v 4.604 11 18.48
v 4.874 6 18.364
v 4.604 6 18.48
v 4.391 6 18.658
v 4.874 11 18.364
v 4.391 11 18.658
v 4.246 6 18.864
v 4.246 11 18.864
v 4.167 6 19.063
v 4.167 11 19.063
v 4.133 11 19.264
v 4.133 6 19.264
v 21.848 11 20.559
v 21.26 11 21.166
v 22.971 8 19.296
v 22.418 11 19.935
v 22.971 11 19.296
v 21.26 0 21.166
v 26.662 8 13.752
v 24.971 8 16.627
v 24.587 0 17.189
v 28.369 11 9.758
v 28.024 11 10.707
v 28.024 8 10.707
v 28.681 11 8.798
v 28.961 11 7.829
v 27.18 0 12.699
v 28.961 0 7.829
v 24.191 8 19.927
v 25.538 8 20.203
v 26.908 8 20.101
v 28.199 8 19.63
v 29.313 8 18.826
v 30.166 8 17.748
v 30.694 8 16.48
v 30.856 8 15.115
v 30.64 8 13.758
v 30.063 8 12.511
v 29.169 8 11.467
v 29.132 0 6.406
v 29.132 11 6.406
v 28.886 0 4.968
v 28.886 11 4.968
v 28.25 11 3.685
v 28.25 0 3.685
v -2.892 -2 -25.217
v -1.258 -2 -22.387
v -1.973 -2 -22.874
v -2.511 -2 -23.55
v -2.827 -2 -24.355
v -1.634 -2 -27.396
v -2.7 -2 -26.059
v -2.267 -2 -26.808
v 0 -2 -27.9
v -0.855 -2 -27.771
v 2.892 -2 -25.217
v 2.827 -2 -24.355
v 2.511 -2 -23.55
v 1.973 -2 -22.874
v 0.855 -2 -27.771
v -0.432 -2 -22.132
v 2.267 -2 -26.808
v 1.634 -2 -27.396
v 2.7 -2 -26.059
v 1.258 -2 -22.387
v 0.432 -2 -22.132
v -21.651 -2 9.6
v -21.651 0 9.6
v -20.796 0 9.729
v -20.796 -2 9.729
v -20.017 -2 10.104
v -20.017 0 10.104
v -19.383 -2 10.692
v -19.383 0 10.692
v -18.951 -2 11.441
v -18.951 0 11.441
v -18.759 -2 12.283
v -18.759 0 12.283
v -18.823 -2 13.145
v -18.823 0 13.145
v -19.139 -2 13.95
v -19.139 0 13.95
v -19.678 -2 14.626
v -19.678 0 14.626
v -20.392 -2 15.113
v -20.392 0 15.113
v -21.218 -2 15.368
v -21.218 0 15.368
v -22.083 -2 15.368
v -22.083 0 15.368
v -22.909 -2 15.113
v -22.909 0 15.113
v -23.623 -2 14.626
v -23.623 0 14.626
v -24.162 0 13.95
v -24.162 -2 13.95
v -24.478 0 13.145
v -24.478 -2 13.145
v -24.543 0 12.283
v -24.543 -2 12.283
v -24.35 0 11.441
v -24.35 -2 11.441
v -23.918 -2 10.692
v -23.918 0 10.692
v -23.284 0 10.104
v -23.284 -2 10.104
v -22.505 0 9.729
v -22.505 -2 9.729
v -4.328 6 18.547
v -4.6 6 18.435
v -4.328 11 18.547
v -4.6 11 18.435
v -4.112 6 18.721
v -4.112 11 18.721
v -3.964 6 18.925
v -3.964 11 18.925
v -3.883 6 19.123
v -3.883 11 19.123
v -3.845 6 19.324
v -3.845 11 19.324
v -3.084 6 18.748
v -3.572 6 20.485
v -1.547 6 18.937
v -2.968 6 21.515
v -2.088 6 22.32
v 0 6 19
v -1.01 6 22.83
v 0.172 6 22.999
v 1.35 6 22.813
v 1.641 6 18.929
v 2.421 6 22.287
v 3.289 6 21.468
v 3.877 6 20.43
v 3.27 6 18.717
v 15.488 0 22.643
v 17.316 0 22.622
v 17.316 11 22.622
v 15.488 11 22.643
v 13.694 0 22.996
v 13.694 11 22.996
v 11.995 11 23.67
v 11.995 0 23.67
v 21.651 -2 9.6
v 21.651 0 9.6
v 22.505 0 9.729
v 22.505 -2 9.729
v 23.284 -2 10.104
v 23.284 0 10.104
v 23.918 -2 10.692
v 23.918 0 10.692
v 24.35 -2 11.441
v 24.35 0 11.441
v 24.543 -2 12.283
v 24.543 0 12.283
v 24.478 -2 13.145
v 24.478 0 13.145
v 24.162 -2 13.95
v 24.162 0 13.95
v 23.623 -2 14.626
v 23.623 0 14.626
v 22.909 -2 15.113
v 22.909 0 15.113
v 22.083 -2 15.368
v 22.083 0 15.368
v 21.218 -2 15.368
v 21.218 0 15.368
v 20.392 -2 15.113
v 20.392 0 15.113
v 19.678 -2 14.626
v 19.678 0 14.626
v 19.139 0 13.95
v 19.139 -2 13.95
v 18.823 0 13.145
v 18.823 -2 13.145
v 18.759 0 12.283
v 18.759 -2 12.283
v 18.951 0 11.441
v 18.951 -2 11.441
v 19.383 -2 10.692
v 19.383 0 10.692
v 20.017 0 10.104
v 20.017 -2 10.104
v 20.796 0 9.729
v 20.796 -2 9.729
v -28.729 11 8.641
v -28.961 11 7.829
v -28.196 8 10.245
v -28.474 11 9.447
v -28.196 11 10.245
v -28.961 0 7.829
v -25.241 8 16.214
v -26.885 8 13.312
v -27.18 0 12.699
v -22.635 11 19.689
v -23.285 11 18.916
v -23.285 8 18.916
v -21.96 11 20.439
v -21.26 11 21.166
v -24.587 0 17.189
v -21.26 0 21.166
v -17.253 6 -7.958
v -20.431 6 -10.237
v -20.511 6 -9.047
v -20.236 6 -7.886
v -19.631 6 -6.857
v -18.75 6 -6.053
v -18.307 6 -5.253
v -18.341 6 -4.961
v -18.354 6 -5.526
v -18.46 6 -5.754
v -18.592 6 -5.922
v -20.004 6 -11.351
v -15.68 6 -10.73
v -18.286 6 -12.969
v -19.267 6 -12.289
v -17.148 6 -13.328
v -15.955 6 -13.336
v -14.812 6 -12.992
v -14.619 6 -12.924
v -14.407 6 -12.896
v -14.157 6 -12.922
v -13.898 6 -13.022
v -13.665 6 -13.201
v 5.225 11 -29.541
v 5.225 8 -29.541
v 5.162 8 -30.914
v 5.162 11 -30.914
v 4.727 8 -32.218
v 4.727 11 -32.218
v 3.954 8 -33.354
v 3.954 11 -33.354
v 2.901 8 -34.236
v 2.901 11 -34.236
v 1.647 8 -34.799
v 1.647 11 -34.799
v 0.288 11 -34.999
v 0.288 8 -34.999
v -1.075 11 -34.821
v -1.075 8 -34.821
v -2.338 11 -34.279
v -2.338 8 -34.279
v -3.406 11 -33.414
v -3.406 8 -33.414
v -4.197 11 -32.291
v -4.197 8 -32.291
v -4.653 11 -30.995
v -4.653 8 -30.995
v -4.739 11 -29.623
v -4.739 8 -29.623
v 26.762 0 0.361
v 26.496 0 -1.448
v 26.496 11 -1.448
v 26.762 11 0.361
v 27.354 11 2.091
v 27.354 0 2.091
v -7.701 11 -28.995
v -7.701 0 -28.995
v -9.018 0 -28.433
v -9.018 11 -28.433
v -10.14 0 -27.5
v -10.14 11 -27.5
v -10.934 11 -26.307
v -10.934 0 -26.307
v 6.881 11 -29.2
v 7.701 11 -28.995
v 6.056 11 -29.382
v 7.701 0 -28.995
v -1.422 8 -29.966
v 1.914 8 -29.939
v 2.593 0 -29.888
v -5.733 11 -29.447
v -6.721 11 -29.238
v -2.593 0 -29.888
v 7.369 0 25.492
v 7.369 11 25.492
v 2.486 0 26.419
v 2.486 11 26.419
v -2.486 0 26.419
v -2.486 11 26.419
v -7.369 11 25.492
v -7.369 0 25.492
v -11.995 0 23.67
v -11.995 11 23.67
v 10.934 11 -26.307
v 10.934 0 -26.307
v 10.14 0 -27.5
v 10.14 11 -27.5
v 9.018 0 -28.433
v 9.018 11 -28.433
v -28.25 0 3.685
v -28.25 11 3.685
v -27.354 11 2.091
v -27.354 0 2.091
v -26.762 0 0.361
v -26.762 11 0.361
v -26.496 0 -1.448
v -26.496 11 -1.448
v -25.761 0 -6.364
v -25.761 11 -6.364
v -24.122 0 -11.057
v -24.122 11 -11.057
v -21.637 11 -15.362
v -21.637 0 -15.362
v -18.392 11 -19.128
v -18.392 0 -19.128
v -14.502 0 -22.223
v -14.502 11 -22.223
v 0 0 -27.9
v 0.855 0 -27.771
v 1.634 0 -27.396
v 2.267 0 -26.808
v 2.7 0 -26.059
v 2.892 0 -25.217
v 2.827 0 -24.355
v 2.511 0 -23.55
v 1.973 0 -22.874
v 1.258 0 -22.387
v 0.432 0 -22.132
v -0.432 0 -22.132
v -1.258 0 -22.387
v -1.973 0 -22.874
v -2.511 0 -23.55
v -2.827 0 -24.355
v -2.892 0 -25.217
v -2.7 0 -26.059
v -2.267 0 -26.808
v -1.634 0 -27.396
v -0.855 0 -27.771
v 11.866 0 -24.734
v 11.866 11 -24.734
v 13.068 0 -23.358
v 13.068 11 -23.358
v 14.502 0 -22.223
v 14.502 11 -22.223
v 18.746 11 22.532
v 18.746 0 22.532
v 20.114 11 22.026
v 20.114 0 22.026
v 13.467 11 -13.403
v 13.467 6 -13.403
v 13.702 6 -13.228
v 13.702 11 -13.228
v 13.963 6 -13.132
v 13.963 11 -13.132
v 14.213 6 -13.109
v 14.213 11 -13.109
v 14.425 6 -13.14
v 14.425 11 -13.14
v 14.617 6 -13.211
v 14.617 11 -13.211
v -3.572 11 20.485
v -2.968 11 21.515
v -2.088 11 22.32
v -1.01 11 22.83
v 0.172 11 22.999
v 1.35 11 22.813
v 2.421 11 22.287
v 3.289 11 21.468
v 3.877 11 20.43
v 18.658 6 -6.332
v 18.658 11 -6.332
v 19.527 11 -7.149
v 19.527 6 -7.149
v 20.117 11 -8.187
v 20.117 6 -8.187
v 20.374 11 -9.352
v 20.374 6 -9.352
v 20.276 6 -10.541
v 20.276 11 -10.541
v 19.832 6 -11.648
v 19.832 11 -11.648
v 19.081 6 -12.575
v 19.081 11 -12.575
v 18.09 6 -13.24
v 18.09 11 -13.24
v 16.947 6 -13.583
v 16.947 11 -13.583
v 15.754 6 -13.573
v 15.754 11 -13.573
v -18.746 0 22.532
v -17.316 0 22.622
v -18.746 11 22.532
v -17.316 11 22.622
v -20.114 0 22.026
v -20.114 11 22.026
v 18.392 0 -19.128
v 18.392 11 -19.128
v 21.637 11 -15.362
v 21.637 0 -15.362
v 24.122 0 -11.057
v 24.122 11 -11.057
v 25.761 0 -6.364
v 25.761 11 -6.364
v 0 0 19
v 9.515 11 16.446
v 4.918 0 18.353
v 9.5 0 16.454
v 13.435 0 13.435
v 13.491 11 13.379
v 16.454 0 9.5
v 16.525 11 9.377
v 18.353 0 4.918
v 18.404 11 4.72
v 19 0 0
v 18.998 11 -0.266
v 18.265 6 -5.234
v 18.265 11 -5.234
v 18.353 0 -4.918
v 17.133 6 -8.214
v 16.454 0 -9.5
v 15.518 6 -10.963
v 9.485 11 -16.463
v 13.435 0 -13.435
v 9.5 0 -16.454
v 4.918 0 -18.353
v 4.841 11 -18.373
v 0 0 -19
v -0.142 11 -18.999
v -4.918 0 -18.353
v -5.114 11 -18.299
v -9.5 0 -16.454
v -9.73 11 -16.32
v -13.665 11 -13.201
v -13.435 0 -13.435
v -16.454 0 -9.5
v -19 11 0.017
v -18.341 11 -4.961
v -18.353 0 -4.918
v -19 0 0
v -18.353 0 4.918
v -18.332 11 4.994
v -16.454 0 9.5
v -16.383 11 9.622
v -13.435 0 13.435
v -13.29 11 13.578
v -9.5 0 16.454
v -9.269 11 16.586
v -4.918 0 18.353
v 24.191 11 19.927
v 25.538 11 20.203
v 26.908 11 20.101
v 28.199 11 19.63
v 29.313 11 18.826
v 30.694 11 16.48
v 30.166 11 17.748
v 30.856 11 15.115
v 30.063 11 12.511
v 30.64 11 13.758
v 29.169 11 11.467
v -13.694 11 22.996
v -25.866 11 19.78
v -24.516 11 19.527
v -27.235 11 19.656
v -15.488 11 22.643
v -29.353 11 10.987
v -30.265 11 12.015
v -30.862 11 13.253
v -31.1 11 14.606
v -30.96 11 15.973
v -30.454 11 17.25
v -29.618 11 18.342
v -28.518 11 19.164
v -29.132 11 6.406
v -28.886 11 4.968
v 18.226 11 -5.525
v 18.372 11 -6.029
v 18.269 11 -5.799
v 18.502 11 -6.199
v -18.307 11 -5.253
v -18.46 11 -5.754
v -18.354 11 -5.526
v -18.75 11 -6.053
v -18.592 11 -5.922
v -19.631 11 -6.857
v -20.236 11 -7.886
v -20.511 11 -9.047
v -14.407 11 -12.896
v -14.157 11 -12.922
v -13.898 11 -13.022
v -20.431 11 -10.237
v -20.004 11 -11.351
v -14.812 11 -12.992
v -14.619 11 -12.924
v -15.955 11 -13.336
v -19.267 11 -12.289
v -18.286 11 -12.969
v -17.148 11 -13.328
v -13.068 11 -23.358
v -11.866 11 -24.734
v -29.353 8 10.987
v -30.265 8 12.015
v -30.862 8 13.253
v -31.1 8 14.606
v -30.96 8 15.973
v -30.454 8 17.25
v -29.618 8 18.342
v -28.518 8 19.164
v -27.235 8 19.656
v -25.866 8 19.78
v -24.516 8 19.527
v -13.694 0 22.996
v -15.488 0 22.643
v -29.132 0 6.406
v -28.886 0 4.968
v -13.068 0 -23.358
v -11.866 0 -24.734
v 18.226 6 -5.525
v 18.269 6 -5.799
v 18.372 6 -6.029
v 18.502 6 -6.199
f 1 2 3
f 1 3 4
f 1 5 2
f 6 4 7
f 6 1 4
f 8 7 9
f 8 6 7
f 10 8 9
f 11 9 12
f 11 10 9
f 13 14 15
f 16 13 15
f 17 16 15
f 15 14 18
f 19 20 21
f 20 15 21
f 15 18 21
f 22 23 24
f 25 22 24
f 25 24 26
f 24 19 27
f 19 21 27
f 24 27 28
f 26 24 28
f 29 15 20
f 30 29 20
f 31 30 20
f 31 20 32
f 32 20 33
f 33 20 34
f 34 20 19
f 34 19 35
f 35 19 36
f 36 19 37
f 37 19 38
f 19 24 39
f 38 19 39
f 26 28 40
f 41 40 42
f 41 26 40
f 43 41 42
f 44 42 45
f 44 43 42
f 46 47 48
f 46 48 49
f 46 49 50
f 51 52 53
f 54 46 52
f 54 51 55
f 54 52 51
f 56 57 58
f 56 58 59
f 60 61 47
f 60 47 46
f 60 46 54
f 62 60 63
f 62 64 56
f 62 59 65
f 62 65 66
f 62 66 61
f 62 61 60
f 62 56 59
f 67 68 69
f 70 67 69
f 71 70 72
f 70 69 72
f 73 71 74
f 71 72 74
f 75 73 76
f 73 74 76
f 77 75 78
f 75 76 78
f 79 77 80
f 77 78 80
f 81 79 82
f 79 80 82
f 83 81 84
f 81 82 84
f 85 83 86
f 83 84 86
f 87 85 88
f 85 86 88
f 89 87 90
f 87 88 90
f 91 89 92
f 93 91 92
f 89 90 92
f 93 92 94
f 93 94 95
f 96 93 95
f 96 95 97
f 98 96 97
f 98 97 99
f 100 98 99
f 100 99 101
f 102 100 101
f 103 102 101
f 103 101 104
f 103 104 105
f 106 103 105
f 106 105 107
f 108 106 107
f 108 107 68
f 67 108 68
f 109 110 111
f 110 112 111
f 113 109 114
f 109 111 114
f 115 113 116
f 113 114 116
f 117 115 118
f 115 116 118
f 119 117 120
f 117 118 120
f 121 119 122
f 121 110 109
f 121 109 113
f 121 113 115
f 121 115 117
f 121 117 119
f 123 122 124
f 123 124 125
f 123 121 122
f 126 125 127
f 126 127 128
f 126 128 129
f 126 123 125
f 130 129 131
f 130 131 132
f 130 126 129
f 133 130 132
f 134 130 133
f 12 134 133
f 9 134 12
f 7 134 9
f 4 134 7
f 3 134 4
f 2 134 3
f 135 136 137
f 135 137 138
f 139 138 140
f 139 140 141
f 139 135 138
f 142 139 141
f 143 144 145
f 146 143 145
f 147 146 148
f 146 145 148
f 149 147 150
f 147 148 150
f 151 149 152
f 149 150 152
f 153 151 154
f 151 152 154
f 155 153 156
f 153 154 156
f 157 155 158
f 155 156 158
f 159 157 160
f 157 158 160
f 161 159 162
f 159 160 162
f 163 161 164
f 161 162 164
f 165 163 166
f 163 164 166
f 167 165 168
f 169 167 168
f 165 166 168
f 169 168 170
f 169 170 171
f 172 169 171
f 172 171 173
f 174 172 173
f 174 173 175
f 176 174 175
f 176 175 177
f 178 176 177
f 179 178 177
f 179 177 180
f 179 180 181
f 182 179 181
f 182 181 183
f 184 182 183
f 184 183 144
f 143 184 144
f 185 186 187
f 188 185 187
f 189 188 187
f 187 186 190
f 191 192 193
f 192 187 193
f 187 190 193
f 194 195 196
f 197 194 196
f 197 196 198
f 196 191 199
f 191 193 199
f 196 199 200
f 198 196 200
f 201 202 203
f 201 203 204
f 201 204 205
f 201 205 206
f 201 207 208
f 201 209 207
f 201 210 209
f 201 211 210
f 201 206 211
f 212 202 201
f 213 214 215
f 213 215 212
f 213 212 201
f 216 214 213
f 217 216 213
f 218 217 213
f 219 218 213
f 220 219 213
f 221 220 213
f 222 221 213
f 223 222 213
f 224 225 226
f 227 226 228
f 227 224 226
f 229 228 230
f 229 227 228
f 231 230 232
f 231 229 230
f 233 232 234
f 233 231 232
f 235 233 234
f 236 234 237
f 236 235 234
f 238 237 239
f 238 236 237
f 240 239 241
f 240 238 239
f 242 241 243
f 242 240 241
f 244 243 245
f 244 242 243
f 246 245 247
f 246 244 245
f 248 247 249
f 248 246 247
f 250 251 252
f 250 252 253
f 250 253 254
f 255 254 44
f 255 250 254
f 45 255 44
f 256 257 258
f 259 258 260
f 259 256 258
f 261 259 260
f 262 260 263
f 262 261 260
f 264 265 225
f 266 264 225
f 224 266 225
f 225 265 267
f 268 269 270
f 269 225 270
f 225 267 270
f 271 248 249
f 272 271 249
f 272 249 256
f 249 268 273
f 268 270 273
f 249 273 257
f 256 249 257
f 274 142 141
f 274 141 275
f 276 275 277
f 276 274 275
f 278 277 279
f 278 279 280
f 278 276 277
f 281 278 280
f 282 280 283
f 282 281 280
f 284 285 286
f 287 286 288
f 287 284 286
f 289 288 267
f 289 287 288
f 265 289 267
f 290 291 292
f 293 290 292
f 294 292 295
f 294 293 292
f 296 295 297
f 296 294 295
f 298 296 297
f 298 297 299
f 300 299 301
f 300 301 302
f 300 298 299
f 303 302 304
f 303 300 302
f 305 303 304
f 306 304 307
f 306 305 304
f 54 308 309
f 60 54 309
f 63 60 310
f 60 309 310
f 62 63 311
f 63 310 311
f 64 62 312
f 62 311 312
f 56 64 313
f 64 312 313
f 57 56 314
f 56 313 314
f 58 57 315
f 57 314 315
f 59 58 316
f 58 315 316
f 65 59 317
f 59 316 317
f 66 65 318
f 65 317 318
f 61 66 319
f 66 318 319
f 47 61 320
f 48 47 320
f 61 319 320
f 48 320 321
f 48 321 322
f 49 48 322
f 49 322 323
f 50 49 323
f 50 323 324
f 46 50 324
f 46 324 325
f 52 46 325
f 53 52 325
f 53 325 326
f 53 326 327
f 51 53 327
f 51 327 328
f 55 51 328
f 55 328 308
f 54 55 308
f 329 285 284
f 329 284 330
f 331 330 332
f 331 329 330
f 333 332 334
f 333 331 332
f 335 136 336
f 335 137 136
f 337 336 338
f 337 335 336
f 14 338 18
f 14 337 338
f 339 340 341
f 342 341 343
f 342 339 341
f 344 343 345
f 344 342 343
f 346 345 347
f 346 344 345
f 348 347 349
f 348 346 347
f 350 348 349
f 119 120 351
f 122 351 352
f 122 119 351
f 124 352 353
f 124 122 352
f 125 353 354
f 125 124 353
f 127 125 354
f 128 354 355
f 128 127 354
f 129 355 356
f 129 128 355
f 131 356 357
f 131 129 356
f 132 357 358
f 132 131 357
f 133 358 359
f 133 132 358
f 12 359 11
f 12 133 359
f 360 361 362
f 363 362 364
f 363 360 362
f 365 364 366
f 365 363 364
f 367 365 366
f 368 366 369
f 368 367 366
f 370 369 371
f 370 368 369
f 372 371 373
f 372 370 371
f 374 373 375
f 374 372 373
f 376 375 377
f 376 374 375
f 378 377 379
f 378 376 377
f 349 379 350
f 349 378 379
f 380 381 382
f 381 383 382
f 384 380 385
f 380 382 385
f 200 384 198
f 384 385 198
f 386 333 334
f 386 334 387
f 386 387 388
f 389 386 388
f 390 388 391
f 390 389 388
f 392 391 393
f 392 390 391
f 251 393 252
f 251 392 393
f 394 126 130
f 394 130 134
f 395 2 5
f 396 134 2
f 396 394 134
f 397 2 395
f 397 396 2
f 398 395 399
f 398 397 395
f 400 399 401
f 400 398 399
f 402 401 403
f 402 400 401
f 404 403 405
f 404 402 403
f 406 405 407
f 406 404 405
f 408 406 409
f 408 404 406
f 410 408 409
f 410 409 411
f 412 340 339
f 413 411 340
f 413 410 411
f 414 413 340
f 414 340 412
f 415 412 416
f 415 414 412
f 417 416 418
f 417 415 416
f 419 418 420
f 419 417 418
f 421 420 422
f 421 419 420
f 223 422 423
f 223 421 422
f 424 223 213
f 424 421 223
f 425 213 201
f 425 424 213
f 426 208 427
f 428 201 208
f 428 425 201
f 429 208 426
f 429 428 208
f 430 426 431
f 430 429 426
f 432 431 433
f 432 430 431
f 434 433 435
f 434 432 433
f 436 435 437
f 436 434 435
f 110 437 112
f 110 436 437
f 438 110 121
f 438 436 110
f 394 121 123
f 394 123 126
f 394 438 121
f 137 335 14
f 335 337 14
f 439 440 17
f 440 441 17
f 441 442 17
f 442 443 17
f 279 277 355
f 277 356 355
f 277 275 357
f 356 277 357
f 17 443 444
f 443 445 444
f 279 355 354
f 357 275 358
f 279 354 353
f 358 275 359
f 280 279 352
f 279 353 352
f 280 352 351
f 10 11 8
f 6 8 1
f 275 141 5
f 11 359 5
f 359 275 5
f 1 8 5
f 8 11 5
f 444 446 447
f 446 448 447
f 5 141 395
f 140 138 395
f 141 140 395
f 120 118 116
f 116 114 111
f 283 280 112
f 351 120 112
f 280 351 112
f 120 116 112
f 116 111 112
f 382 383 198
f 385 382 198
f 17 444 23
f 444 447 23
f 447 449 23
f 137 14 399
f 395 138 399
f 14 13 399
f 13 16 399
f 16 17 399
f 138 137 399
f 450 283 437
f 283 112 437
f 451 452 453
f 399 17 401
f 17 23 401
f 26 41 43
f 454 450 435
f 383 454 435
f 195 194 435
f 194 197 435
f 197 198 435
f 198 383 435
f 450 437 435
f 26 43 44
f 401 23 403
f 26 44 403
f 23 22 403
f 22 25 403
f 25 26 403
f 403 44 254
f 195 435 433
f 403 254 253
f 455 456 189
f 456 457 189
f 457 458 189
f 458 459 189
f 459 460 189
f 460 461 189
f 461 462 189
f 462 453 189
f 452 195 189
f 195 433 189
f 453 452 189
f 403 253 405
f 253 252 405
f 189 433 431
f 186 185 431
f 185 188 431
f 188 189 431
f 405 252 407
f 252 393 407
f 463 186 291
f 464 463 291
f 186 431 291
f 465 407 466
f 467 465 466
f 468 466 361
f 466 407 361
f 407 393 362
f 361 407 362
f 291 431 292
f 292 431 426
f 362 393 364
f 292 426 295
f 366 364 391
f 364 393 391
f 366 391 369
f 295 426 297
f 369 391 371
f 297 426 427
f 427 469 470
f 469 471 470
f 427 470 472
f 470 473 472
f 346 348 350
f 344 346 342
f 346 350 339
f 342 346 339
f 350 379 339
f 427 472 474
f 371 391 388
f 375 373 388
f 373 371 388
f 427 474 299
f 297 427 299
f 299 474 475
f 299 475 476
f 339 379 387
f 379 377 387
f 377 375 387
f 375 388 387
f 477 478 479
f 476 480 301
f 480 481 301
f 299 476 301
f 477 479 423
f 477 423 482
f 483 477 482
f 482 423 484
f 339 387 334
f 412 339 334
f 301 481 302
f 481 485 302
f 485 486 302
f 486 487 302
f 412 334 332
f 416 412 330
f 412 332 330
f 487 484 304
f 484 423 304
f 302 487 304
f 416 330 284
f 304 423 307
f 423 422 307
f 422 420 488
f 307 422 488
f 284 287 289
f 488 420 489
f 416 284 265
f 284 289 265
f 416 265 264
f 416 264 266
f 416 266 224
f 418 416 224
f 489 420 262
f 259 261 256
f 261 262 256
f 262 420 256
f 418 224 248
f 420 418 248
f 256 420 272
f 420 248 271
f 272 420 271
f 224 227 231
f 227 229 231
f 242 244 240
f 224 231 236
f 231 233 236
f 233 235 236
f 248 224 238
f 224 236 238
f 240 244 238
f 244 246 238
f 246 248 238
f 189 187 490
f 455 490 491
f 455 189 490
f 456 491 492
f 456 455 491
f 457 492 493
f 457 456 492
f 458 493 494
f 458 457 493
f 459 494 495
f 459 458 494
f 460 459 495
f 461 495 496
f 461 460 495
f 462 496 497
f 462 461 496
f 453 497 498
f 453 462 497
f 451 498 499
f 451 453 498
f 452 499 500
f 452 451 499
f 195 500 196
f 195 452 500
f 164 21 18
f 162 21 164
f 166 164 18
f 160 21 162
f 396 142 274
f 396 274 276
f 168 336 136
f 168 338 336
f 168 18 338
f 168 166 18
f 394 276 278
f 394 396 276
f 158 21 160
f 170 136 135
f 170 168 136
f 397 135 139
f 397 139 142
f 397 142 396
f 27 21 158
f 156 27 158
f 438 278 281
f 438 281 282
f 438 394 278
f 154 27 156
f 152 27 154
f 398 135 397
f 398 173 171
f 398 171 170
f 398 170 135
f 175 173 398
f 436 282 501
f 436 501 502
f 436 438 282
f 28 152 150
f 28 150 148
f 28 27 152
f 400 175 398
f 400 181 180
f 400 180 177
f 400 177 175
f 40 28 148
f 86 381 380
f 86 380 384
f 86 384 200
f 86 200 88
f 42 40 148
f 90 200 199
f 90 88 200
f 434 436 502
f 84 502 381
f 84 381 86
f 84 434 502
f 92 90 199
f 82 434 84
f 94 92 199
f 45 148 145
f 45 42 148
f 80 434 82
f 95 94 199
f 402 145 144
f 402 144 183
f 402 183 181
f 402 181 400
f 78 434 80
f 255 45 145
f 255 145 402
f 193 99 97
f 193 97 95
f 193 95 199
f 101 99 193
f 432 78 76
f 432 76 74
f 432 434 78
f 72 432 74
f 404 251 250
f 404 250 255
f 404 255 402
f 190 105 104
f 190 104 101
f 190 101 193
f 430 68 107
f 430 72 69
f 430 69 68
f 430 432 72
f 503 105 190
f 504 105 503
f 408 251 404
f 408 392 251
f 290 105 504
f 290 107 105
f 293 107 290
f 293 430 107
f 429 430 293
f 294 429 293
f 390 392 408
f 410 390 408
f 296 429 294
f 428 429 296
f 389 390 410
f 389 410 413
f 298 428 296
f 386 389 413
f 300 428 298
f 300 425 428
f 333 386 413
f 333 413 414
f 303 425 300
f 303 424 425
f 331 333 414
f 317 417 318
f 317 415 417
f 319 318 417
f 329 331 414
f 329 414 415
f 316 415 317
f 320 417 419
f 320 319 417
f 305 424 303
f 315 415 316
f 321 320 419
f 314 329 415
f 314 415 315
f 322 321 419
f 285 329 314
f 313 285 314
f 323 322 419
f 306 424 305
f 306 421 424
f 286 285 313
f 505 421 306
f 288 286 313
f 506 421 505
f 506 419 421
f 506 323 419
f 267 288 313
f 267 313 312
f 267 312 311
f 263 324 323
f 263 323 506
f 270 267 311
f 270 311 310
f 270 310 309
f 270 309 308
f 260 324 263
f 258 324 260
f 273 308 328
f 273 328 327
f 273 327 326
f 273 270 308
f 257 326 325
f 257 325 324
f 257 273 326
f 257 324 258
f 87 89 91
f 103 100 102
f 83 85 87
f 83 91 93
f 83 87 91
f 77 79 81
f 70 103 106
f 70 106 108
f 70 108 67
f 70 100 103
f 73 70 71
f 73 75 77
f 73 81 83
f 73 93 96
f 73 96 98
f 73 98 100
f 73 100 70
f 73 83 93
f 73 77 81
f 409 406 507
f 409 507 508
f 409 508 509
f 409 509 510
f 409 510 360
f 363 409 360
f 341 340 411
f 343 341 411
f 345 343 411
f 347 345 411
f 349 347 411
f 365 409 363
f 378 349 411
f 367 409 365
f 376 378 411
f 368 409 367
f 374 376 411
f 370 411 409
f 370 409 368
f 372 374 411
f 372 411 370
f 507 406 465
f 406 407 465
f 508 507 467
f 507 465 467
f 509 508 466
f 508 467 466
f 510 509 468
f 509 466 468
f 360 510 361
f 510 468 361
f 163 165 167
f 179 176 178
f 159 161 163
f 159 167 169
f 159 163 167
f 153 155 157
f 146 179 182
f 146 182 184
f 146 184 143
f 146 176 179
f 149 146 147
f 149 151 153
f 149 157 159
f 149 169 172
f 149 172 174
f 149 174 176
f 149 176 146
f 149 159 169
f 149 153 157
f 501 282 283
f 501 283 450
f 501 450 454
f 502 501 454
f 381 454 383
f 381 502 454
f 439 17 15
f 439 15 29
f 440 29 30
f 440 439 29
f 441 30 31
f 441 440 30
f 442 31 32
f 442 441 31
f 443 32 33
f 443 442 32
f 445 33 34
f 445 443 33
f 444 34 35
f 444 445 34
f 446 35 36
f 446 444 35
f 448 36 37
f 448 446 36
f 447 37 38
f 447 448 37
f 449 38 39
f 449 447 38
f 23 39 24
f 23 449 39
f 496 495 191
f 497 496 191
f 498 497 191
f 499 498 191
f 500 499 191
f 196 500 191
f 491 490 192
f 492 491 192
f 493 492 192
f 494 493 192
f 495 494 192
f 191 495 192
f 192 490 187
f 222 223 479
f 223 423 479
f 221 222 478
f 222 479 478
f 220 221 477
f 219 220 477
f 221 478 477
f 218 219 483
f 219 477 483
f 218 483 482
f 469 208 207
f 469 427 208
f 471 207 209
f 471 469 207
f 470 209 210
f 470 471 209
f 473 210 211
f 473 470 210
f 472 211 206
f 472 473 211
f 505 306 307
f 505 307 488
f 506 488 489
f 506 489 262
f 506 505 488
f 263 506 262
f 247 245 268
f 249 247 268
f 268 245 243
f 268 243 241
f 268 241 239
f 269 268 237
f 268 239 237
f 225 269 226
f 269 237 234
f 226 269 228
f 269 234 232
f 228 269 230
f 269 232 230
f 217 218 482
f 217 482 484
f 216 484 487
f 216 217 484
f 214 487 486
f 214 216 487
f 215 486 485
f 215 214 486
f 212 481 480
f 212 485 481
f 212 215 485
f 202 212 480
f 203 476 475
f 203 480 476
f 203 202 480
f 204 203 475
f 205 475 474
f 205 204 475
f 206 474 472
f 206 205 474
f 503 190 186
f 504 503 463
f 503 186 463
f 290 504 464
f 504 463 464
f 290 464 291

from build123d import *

# Parameters (mm, degrees)
SKETCH1_R                = 19
BOSS_EXTRUDE1_DEPTH      = 3.5
SKETCH2_R                = 30
SKETCH2_R_2              = 19
SKETCH2_R_3              = 2.8
BOSS_EXTRUDE2_DEPTH      = 11
BOSS_EXTRUDE3_DEPTH      = 2
BOSS_EXTRUDE3_DEPTH_BACK = 11
SKETCH4_R                = 2.9
SKETCH5_R                = 5
BOSS_EXTRUDE4_DEPTH      = 3
CUT_EXTRUDE1_START       = -10
SKETCH3_R                = 19
CUT_EXTRUDE1_DEPTH       = 10
CUT_EXTRUDE3_START       = -13
CUT_EXTRUDE3_DEPTH       = 13
FILLET1_R                = 10
FILLET2_R                = 5
CUT_EXTRUDE4_START       = -5
SKETCH8_R                = 4
SKETCH8_R_2              = 19
CUT_EXTRUDE4_DEPTH       = 11
FILLET3_R                = 1


with BuildPart() as part:
    # Sketch1 → Boss-Extrude1 (new body)
    with BuildSketch(Plane(origin=(0, 0, 0), x_dir=(1, 0, 0), z_dir=(0, 1, 0))):
        with Locations(Location((0, 0, 0), (0, 0, 270))):
            Circle(SKETCH1_R)
    extrude(amount=BOSS_EXTRUDE1_DEPTH)

    # Sketch2 → Boss-Extrude2 (add)
    with BuildSketch(Plane(origin=(0, 0, 0), x_dir=(1, 0, 0), z_dir=(0, 1, 0))):
        with Locations(Location((0, 0, 0), (0, 0, 270))):
            Circle(SKETCH2_R)
        with Locations(Location((0, 0, 0), (0, 0, 270))):
            Circle(SKETCH2_R_2, mode=Mode.SUBTRACT)
        with Locations(Location((0, 25, 0), (0, 0, 270))):
            Circle(SKETCH2_R_3, mode=Mode.SUBTRACT)
        with Locations(Location((21.650635095, -12.5, 0), (0, 0, 270))):
            Circle(SKETCH2_R_3, mode=Mode.SUBTRACT)
        with Locations(Location((-21.650635095, -12.5, 0), (0, 0, 270))):
            Circle(SKETCH2_R_3, mode=Mode.SUBTRACT)
    extrude(amount=BOSS_EXTRUDE2_DEPTH)

    # Sketch4 → Boss-Extrude3 (add, two sides: drawn at the far end of the back side and taken through both)
    with BuildSketch(Plane.XZ.offset(-BOSS_EXTRUDE3_DEPTH_BACK)):
        with Locations(Location((-21.650635095, 12.5, 0), (0, 0, 270))):
            Circle(SKETCH4_R)
        with Locations(Location((21.650635095, 12.5, 0), (0, 0, 270))):
            Circle(SKETCH4_R)
        with Locations(Location((0, -25, 0), (0, 0, 270))):
            Circle(SKETCH4_R)
    extrude(amount=BOSS_EXTRUDE3_DEPTH + BOSS_EXTRUDE3_DEPTH_BACK)

    # Sketch5 → Boss-Extrude4 (add)
    with BuildSketch(Plane(origin=(0, 11, 0), x_dir=(1, 0, 0), z_dir=(0, 1, 0))):
        with Locations((-26.103110985, -14.7860609)):
            Circle(SKETCH5_R)
        with Locations((0.246451131, 29.99898768)):
            Circle(SKETCH5_R)
        with Locations((25.856659853, -15.212926781)):
            Circle(SKETCH5_R)
    extrude(amount=-BOSS_EXTRUDE4_DEPTH)

    # Sketch3 → Cut-Extrude1 (cut)
    with BuildSketch(Plane(origin=(0, 3.5, 0), x_dir=(1, 0, 0), z_dir=(0, 1, 0)).offset(CUT_EXTRUDE1_START)):
        with Locations(Location((0, 0, 0), (0, 0, 270))):
            Circle(SKETCH3_R)
    extrude(amount=CUT_EXTRUDE1_DEPTH, mode=Mode.SUBTRACT)

    # Sketch7 → Cut-Extrude3 (cut)
    with BuildSketch(Plane(origin=(0, 11, 0), x_dir=(1, 0, 0), z_dir=(0, 1, 0)).offset(CUT_EXTRUDE3_START)):
        with BuildLine():
            ThreePointArc((-29.54423259, -5.20944533), (-25.980762114, 15), (-10.2606043, 28.190778624))
            Line((-10.2606043, 28.190778624), (-13.773984089, 37.84371026))
            Line((-13.773984089, 37.84371026), (-43.939319858, -7.747687605))
            Line((-43.939319858, -7.747687605), (-29.54423259, -5.20944533))
        make_face()
        with BuildLine():
            ThreePointArc((-26.13264562, -4.6078905), (-22.980662881, 13.267891901), (-9.075772579, 24.935480225))
            Line((-9.075772579, 24.935480225), (-10.2606043, 28.190778624))
            ThreePointArc((-10.2606043, 28.190778624), (-25.980762114, 15), (-29.54423259, -5.20944533))
            Line((-29.54423259, -5.20944533), (-26.13264562, -4.6078905))
        make_face()
        with BuildLine():
            Line((15.259965643, 41.926411025), (10.2606043, 28.190778624))
            ThreePointArc((10.2606043, 28.190778624), (25.980762114, 15), (29.54423259, -5.20944533))
            Line((29.54423259, -5.20944533), (39.660606503, -6.993234998))
            Line((39.660606503, -6.993234998), (15.259965643, 41.926411025))
        make_face()
        with BuildLine():
            Line((10.2606043, 28.190778624), (9.075772579, 24.935480225))
            ThreePointArc((9.075772579, 24.935480225), (21.736841548, 15.220300308), (26.535783801, 0))
            ThreePointArc((26.535783801, 0), (26.434807132, -2.312745947), (26.13264562, -4.6078905))
            Line((26.13264562, -4.6078905), (29.54423259, -5.20944533))
            ThreePointArc((29.54423259, -5.20944533), (25.980762114, 15), (10.2606043, 28.190778624))
        make_face()
        with BuildLine():
            Line((28.679354216, -34.17872342), (19.283628291, -22.981333294))
            ThreePointArc((19.283628291, -22.981333294), (0, -30), (-19.283628291, -22.981333294))
            Line((-19.283628291, -22.981333294), (-25.886622414, -30.850475262))
            Line((-25.886622414, -30.850475262), (28.679354216, -34.17872342))
        make_face()
        with BuildLine():
            Line((19.283628291, -22.981333294), (17.056873041, -20.327589725))
            ThreePointArc((17.056873041, -20.327589725), (0, -26.535783801), (-17.056873041, -20.327589725))
            Line((-17.056873041, -20.327589725), (-19.283628291, -22.981333294))
            ThreePointArc((-19.283628291, -22.981333294), (0, -30), (19.283628291, -22.981333294))
        make_face()
    extrude(amount=CUT_EXTRUDE3_DEPTH, mode=Mode.SUBTRACT)

    # Fillet1
    # the kernel refuses this fillet: 10 mm, written as the material it adds along each edge
    with BuildSketch(Plane(origin=(-26.13264562, 0, 4.6078905), x_dir=(-0.9848077530122318, 0, 0.17364817766679624), z_dir=(0, 1, 0)), Plane(origin=(17.056873041, 0, 20.327589725), x_dir=(0.6427876096865569, 0, 0.7660444431189634), z_dir=(0, 1, 0)), Plane(origin=(9.075772579, 0, -24.935480225), x_dir=(0.34202014332561265, 0, -0.9396926207859289), z_dir=(0, 1, 0))) as fillet1_piece_1:
        with BuildLine():
            CenterArc((9.045274498, -8.297697769), FILLET1_R, 123.92490422, 42.948020906)
            Line((-0.693413056, -6.026582466), (-0.888186807, -5.98116016))
            ThreePointArc((-0.888186807, -5.98116016), (-0.372612378, -3.01031053), (-0.2, 0))
            Line((-0.2, 0), (0, 0.2))
            ThreePointArc((0, 0.2), (1.732108099, 0.2), (3.352595033, 0.165953955))
            Line((3.352595033, 0.165953955), (3.464216199, 0))
        make_face()
    extrude(amount=11)
    with BuildSketch(Plane(origin=(-17.056873041, 0, 20.327589725), x_dir=(0.8344973728156843, 0, 0.551011918894429), z_dir=(0, 1, 0)), Plane(origin=(26.13264562, 0, 4.6078905), x_dir=(0.059941633142754296, 0, -0.99820188369697), z_dir=(0, 1, 0)), Plane(origin=(-9.075772579, 0, -24.935480225), x_dir=(-0.8944390059584274, 0, 0.44718996480254386), z_dir=(0, 1, 0))) as fillet1_piece_2:
        with BuildLine():
            CenterArc((7.20939257, -9.934457095), FILLET1_R, 96.563537437, 42.948020906)
            Line((-0.39597707, -3.441510719), (-0.548084463, -3.311651792))
            ThreePointArc((-0.548084463, -3.311651792), (-0.396677677, -1.697894369), (-0.198689142, 0.022860991))
            Line((-0.198689142, 0.022860991), (0.022860991, 0.198689142))
            ThreePointArc((0.022860991, 0.198689142), (3.03317152, 0.026076764), (6.04348205, 0.198689142))
            Line((6.04348205, 0.198689142), (6.06634304, 0))
        make_face()
    extrude(amount=11)

    # Fillet2
    fillet2_edges = [part.edges().sort_by_distance(p)[0] for p in [
        (-10.2606043, 5.5, -28.190778624),
        (-29.54423259, 5.5, 5.20944533),
        (-19.283628291, 5.5, 22.981333294),
        (19.283628291, 5.5, 22.981333294),
        (29.54423259, 5.5, 5.20944533),
        (10.2606043, 5.5, -28.190778624),
    ]]
    fillet(fillet2_edges, radius=FILLET2_R)

    # Sketch8 → Cut-Extrude4 (cut)
    with BuildSketch(Plane(origin=(0, 11, 0), x_dir=(1, 0, 0), z_dir=(0, 1, 0)).offset(CUT_EXTRUDE4_START)):
        with Locations((-16.524893724, 9.376987118)):
            Circle(SKETCH8_R)
        with Locations(Location((0, 0, 0), (0, 0, 42.512080704))):
            Circle(SKETCH8_R_2)
        with Locations((16.383155917, 9.622484201)):
            Circle(SKETCH8_R)
        with Locations((0.141737807, -18.999471319)):
            Circle(SKETCH8_R)
    extrude(amount=CUT_EXTRUDE4_DEPTH, mode=Mode.SUBTRACT)

    # Fillet3
    fillet3_edges = [part.edges().sort_by_distance(p)[0] for p in [
        (4.116263726, 8.5, 18.548756641),
        (-3.83907012, 8.5, 18.608104165),
        (14.005562597, 8.5, -12.839167276),
        (18.034625983, 8.5, -5.979319831),
        (-18.121826323, 8.5, -5.709589366),
        (-14.195555863, 8.5, -12.628784333),
    ]]
    fillet(fillet3_edges, radius=FILLET3_R)


solid = part.part
